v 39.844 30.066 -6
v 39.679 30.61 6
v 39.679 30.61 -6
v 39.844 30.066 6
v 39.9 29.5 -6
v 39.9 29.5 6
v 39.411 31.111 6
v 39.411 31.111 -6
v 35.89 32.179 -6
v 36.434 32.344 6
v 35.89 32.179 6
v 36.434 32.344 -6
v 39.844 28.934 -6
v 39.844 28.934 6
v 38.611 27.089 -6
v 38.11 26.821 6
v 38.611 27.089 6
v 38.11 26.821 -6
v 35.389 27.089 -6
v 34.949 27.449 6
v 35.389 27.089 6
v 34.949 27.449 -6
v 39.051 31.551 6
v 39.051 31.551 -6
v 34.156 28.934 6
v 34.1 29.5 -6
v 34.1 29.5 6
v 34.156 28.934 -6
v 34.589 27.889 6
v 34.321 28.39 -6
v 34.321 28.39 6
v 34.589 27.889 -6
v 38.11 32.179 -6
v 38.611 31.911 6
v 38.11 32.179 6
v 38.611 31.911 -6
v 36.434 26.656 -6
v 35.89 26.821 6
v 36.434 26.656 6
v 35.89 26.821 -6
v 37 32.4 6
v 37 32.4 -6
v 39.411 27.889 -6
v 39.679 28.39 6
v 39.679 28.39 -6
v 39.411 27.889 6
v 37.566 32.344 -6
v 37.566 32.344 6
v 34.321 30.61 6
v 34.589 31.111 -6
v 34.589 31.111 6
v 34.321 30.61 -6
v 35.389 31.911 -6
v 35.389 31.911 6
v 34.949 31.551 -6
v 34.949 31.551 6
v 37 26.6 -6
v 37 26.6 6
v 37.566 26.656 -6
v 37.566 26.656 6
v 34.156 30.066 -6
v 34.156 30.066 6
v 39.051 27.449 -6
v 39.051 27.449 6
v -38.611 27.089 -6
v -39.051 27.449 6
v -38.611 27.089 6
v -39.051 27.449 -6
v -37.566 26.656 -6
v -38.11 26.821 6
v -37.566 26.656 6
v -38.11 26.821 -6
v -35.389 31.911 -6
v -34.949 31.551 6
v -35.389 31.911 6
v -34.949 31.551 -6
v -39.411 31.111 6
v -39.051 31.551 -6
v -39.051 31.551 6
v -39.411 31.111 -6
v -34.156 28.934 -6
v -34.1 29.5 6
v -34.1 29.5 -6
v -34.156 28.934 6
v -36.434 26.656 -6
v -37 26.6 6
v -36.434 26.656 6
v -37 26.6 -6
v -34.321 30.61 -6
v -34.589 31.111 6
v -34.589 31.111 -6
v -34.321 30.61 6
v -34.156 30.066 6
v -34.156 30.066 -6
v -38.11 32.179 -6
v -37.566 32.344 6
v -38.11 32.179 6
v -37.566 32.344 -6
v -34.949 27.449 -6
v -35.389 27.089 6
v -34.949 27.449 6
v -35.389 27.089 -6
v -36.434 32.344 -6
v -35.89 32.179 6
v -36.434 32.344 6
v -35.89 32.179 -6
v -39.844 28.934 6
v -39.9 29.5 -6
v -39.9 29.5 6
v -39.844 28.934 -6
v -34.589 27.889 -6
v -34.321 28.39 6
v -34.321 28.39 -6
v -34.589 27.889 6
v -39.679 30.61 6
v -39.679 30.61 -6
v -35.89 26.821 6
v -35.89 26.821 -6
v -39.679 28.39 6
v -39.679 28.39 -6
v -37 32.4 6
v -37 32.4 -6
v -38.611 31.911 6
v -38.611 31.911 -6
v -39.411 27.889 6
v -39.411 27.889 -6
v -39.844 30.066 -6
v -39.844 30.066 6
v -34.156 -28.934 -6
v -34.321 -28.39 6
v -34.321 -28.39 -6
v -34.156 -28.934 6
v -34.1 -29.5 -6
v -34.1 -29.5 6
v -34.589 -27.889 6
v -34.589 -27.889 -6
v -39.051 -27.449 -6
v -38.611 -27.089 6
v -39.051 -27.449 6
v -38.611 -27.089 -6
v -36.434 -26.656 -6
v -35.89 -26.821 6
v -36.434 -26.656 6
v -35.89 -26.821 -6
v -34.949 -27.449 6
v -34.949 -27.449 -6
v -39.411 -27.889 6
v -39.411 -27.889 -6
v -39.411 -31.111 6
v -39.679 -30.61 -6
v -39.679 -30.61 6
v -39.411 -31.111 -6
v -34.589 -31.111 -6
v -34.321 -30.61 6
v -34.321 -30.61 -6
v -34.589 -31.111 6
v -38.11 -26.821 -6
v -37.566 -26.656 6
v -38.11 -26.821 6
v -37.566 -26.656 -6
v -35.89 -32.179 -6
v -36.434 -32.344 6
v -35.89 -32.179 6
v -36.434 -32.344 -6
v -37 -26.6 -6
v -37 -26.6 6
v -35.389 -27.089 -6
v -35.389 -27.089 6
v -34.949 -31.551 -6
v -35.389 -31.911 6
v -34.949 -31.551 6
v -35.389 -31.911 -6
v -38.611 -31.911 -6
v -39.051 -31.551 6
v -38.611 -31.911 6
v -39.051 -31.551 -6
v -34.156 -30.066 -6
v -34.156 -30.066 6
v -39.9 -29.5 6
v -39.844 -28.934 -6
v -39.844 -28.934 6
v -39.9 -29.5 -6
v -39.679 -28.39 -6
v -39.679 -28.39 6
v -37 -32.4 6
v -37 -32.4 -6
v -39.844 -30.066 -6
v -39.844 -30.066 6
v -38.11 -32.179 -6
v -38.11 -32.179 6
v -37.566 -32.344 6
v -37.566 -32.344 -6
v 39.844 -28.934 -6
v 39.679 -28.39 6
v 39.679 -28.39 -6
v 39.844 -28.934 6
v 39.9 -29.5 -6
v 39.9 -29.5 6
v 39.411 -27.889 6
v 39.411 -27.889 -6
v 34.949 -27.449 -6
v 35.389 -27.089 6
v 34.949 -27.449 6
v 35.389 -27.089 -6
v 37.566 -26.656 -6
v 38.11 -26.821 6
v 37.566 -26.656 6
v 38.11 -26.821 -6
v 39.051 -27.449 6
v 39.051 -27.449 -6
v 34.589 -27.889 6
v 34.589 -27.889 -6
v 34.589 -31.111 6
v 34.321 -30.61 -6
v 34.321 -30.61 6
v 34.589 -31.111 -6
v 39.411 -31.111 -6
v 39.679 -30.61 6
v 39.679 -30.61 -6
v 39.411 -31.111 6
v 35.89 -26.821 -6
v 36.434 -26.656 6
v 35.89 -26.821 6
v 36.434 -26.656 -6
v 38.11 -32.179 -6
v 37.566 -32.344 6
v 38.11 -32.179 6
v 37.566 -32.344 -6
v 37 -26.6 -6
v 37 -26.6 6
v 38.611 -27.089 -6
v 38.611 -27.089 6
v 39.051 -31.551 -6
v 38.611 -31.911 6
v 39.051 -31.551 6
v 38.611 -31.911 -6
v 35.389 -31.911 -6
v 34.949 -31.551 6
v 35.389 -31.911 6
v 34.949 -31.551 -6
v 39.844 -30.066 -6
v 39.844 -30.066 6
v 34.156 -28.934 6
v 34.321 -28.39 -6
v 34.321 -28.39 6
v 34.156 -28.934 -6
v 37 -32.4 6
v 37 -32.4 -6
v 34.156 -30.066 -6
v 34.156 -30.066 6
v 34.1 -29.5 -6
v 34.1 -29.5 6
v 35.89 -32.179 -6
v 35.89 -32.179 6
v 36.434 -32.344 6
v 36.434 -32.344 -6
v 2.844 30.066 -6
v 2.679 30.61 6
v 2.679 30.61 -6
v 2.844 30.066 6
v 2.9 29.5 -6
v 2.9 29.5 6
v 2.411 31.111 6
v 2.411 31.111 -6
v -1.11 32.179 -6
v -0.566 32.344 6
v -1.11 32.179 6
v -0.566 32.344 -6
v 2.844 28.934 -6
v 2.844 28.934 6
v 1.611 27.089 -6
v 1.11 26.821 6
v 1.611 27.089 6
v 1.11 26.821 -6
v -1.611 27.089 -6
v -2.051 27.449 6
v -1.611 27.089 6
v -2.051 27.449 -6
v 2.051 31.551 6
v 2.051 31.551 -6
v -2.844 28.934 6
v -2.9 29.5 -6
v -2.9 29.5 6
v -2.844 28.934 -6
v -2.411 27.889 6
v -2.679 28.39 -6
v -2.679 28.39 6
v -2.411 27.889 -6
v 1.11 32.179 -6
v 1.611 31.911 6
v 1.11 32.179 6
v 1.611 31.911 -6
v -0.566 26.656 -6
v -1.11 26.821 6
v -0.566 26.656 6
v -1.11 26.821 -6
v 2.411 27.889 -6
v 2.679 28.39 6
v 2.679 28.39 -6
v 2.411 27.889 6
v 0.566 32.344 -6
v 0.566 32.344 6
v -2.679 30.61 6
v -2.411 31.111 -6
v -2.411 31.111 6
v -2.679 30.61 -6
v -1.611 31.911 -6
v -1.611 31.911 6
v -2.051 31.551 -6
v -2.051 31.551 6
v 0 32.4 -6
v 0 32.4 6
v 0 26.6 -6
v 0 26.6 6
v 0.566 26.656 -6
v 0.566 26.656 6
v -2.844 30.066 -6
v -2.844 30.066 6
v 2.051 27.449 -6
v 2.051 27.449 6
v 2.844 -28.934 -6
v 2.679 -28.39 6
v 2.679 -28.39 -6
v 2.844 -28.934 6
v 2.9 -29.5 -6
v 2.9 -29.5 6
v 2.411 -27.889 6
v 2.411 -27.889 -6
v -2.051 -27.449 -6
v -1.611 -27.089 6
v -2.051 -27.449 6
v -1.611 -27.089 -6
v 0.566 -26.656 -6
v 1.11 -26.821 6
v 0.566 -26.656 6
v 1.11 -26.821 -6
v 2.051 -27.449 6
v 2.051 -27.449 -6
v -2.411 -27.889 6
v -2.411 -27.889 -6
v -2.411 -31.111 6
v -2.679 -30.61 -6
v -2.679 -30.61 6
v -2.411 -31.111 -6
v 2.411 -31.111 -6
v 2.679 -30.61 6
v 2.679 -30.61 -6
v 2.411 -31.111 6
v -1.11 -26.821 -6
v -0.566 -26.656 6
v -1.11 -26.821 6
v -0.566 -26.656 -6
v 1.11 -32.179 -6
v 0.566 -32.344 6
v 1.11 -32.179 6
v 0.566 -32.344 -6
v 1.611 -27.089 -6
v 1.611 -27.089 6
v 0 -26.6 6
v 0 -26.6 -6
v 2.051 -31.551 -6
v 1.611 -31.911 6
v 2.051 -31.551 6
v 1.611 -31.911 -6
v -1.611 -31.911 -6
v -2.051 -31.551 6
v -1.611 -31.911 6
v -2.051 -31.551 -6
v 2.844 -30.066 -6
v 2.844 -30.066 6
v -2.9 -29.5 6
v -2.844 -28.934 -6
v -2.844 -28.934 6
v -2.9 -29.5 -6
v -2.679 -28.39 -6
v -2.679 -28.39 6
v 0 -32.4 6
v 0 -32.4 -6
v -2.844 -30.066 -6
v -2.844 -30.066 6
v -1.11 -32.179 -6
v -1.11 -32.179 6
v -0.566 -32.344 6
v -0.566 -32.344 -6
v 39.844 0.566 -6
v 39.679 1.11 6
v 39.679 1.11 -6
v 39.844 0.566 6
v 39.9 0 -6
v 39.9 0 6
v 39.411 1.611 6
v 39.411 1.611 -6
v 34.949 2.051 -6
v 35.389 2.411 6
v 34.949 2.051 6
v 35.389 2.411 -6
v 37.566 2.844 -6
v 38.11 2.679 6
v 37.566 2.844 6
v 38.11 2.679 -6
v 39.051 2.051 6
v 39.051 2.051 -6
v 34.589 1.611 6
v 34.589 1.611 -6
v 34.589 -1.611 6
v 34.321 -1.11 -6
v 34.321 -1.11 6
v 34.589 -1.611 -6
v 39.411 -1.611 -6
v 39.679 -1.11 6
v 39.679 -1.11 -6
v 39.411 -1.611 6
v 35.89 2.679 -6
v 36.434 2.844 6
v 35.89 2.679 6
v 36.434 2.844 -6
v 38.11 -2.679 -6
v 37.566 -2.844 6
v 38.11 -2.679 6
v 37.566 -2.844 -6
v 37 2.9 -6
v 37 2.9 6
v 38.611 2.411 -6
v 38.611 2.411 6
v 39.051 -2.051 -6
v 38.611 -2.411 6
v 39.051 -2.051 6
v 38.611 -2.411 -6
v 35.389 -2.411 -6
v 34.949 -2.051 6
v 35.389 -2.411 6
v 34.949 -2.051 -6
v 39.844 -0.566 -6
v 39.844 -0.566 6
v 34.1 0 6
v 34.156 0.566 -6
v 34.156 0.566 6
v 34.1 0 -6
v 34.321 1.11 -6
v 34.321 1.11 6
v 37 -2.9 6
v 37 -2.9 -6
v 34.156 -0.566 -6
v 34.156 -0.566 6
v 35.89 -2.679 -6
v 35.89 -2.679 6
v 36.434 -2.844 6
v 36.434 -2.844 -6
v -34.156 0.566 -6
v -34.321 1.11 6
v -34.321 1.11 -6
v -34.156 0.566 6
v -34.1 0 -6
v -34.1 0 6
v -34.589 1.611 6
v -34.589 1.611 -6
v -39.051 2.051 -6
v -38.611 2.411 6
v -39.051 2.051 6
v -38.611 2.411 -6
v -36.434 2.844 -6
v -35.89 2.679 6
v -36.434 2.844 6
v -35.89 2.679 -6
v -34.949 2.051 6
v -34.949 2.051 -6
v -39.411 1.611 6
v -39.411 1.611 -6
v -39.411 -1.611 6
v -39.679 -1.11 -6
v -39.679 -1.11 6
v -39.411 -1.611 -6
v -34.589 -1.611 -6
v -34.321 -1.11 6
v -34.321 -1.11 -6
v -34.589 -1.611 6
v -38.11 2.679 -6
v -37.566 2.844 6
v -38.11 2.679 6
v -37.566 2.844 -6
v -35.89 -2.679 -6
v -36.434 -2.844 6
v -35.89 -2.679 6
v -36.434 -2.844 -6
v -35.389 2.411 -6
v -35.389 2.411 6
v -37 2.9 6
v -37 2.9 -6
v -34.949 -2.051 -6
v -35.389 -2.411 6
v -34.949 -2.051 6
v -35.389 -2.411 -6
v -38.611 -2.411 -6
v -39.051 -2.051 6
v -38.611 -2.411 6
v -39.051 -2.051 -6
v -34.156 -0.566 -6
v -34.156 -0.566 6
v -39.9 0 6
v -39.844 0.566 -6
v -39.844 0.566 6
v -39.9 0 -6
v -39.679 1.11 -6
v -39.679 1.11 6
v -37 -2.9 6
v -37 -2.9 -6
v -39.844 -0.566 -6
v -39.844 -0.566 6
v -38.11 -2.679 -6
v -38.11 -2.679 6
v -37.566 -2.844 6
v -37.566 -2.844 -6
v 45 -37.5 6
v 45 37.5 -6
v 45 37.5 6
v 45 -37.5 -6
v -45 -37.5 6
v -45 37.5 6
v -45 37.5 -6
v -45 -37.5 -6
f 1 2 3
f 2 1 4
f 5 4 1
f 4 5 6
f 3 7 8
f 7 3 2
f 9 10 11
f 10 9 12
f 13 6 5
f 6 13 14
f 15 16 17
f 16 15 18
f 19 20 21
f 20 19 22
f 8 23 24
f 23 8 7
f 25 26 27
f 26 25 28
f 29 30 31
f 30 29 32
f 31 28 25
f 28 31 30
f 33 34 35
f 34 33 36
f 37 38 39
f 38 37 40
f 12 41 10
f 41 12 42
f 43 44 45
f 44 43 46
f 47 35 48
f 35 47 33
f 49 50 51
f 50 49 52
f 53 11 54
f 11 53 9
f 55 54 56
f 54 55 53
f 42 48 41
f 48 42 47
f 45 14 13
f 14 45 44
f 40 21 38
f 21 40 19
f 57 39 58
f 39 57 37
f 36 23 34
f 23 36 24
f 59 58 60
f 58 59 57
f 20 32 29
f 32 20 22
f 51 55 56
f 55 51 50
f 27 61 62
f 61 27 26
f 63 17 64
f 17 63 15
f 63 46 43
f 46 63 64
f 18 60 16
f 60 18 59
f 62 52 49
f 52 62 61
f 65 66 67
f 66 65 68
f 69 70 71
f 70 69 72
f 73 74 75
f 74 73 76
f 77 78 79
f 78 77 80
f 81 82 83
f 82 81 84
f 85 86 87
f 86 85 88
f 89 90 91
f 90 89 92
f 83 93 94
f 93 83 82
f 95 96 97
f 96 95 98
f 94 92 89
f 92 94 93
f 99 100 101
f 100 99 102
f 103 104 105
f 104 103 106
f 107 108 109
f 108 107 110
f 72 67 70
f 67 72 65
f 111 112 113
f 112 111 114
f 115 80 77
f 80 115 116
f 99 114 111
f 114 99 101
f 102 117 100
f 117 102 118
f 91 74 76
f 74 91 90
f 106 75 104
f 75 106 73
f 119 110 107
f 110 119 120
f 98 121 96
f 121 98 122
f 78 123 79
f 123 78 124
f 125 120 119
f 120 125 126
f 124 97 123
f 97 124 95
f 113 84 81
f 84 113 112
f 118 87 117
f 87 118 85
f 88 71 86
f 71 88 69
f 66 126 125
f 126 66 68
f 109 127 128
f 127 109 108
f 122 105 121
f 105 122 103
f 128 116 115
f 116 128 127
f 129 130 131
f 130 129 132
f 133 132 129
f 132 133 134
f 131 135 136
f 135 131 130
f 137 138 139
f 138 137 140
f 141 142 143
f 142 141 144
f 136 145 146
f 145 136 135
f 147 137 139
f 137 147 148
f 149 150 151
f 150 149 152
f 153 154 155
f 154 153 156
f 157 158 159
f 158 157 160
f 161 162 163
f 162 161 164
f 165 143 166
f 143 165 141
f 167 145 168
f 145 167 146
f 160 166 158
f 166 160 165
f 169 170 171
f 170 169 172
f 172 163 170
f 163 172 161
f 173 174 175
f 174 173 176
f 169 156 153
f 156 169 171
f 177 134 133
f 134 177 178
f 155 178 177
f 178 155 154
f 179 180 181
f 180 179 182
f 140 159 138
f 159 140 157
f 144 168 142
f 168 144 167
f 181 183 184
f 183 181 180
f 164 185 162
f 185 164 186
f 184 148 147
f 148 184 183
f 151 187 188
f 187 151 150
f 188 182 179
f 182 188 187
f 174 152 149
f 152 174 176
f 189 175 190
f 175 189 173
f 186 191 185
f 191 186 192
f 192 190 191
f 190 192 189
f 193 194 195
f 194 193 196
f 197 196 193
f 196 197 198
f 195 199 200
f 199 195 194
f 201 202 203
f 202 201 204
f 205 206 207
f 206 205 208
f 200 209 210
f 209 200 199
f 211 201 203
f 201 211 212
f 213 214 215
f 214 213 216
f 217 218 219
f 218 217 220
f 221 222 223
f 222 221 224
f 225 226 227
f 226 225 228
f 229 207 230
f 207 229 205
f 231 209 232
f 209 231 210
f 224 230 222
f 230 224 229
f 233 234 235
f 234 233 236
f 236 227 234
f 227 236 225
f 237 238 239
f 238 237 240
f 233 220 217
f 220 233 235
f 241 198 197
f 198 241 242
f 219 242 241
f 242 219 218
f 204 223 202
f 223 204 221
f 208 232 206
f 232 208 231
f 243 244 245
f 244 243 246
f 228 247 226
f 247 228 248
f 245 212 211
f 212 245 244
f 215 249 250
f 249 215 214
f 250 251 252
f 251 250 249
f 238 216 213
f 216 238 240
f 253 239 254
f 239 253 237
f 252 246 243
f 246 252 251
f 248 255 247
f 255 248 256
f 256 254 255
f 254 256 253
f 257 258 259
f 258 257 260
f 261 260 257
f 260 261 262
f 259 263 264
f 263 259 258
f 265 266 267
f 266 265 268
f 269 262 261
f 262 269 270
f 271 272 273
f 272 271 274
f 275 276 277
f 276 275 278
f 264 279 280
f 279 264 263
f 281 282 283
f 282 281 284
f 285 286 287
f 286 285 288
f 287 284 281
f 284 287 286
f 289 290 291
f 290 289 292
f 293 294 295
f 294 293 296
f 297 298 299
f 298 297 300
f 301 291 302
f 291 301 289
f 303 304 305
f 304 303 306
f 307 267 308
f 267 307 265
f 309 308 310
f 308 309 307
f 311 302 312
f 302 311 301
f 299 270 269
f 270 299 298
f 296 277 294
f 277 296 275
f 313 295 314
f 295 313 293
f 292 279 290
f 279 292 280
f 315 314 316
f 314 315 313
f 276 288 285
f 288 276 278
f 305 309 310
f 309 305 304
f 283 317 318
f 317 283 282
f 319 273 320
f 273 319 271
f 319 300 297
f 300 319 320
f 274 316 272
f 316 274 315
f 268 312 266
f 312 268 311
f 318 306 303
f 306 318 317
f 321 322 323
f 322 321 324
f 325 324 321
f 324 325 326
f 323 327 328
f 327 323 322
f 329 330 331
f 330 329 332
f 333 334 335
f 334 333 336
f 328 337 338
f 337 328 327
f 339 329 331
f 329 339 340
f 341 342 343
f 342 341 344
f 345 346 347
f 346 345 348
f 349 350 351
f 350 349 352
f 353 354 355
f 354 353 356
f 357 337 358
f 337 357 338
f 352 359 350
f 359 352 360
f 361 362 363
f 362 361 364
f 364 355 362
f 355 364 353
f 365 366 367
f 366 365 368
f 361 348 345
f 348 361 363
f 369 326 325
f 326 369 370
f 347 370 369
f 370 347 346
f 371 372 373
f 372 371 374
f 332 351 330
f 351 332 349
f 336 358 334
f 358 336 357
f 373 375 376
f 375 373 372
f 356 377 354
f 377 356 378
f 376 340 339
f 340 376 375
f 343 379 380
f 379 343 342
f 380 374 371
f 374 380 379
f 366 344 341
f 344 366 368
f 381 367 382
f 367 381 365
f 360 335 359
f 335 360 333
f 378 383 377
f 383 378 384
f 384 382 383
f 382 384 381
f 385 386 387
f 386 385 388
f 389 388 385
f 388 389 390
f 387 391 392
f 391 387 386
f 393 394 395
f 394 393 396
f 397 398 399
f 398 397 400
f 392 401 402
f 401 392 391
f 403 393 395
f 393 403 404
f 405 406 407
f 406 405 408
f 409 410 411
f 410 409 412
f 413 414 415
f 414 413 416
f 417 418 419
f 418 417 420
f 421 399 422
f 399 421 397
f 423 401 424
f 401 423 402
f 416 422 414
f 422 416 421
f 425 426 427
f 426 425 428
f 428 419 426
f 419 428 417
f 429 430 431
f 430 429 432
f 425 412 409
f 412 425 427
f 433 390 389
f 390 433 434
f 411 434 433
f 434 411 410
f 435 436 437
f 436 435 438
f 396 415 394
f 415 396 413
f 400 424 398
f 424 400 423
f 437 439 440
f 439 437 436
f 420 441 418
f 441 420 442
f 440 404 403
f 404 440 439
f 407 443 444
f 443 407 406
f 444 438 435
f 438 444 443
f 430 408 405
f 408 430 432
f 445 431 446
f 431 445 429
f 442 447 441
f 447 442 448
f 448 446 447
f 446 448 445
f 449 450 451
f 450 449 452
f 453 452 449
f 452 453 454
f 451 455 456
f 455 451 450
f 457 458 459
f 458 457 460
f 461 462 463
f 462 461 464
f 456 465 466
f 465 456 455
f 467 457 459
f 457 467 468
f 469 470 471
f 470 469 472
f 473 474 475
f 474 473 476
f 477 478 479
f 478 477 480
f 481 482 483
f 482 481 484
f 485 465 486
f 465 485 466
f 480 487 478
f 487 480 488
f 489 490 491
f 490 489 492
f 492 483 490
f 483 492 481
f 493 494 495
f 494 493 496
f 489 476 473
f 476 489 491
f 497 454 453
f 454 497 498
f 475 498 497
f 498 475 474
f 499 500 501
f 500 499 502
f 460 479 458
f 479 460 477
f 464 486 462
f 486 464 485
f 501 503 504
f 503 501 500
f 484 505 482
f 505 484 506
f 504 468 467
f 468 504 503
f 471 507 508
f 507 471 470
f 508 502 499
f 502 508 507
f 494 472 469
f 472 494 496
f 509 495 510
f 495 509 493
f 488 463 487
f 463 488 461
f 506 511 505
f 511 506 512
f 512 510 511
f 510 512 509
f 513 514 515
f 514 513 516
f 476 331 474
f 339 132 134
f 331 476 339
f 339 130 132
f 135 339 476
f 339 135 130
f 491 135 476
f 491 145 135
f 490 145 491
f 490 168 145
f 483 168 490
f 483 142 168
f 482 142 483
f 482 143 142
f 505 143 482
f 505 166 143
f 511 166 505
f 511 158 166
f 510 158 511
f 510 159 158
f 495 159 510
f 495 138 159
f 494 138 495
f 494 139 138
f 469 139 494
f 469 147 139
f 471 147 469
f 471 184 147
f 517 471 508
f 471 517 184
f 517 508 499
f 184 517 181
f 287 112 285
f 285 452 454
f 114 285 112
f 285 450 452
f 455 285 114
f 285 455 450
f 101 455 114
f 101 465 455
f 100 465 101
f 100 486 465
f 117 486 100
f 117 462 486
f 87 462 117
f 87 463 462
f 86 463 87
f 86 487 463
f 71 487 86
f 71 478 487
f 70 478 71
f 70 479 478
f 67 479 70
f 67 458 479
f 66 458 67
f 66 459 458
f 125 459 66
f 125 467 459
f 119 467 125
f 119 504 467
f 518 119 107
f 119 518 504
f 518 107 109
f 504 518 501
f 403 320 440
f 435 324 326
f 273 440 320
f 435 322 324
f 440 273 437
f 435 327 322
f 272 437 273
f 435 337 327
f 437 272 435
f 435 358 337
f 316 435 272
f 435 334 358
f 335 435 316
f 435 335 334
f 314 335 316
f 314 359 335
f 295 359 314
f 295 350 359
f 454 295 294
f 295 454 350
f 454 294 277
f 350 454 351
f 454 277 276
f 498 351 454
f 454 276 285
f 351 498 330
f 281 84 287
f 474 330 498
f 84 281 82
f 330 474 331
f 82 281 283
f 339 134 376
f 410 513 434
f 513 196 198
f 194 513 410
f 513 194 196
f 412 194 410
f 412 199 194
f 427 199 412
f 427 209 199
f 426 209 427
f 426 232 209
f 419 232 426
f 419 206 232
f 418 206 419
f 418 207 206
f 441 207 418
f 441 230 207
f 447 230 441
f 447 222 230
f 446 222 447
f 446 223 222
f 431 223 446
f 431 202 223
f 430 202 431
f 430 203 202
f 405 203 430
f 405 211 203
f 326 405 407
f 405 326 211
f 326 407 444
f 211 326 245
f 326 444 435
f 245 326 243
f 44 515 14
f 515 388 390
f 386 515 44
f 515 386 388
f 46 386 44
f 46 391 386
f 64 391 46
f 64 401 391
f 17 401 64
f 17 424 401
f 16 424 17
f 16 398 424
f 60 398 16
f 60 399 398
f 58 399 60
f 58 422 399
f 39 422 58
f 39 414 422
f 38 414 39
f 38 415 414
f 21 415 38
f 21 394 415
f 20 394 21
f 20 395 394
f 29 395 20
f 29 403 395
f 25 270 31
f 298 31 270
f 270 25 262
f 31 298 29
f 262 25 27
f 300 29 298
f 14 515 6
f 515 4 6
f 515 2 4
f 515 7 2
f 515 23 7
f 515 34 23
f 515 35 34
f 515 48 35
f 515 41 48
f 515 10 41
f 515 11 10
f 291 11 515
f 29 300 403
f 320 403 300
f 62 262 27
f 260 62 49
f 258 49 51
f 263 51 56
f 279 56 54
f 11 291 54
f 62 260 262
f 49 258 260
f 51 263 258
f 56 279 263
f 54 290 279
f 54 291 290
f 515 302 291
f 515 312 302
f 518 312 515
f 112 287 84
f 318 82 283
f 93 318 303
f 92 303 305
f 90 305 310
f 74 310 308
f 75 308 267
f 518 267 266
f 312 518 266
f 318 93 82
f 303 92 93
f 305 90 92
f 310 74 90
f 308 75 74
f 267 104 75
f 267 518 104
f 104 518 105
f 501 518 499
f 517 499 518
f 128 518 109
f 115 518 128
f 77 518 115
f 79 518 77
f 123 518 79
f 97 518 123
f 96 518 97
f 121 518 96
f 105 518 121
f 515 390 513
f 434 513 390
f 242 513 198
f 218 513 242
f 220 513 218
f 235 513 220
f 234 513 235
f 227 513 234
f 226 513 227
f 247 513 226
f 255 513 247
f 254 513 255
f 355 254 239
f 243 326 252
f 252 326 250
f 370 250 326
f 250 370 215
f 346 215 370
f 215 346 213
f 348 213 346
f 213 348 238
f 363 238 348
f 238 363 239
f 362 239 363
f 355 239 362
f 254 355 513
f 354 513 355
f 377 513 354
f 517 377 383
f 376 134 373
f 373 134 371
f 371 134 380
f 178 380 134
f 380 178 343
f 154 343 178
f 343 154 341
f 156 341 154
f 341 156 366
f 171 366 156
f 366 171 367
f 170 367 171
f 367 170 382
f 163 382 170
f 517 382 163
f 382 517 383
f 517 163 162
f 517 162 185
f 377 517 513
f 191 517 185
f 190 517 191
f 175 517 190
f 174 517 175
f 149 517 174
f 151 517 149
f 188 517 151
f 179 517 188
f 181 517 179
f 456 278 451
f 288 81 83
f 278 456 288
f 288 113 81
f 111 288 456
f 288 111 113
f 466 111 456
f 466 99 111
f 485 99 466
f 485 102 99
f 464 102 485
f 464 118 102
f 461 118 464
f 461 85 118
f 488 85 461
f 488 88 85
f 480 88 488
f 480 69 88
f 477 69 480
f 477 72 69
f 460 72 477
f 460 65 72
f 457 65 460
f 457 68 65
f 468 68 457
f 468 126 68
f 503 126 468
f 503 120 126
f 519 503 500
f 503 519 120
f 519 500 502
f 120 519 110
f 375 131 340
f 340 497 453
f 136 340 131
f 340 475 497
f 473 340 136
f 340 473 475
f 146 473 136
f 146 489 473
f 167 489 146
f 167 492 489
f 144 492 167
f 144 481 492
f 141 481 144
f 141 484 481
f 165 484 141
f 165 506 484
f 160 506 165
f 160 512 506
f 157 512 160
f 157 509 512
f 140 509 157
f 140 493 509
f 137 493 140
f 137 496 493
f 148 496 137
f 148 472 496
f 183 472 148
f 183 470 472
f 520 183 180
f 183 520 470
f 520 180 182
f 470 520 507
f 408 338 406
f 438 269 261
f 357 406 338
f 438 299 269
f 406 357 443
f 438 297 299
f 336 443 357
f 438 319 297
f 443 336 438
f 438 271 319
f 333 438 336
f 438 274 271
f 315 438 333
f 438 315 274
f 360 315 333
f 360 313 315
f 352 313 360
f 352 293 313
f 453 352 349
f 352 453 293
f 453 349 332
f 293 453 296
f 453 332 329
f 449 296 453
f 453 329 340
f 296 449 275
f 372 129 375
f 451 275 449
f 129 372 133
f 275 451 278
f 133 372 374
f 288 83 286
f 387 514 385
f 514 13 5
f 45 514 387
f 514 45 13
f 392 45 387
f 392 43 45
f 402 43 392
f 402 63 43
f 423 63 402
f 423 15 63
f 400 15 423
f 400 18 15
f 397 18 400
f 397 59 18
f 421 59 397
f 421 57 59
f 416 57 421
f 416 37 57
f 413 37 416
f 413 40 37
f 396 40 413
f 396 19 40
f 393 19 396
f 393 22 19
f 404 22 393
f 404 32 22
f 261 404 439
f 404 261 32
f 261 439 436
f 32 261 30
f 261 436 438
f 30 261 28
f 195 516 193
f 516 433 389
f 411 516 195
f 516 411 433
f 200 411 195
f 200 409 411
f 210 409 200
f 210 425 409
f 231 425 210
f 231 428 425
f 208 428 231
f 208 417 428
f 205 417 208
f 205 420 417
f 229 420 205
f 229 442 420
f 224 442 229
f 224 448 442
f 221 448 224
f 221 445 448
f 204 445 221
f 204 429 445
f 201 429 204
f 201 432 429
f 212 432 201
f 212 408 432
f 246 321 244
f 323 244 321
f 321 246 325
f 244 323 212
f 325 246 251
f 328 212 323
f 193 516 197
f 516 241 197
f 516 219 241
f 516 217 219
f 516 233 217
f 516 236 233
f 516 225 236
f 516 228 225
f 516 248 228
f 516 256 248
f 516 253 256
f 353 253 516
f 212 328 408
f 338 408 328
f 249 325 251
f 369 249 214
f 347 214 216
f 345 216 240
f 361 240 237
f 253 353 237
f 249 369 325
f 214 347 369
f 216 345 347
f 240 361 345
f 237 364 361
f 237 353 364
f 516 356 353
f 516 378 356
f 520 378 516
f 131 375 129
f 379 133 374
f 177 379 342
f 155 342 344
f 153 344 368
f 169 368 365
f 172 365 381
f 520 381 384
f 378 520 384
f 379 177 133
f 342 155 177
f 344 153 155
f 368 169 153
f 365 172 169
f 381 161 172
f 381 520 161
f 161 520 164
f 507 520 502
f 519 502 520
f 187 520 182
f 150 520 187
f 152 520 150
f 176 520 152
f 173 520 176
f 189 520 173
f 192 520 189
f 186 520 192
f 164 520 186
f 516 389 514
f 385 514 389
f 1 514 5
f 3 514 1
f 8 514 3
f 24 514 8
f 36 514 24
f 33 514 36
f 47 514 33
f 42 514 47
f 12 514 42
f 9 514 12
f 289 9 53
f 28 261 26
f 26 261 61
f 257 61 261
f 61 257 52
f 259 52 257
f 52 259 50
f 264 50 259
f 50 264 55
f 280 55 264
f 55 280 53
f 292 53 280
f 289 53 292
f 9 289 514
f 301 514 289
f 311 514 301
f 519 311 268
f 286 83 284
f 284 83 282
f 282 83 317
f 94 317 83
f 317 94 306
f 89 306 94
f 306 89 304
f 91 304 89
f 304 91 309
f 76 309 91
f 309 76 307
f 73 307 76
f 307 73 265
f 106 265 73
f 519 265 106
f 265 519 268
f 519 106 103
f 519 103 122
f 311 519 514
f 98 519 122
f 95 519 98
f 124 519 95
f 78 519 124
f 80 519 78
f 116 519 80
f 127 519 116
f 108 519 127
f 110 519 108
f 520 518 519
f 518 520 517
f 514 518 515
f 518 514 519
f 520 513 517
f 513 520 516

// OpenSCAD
$fn = 32;

// ----------------------------------------------------------------------
// Corner plate 90 x 75 x 12
// 8 holes, centres taken from the edge offset
// ----------------------------------------------------------------------

// --- parameters (mm) ---
plate = [90, 75, 12];   // overall size (x, y, z)
holes = 8;              // number of holes the drawing asks for
bore_d = 5.5;           // nominal hole diameter from the drawing
print_allowance = 0.3;  // clearance added for printing
edge = 8;               // hole centre offset from the plate edge

// --- derived feature positions (mm) ---
hole_d = bore_d + print_allowance;  // = 5.8   hole diameter as printed
corner_x = plate[0] / 2 - edge;     // = 37   corner hole X
corner_y = plate[1] / 2 - edge;     // = 29.5   corner hole Y
feature_centers = [
  [corner_x, corner_y],
  [-corner_x, corner_y],
  [-corner_x, -corner_y],
  [corner_x, -corner_y],
  [0, corner_y],
  [0, -corner_y],
  [corner_x, 0],
  [-corner_x, 0]
];   // hole centres the loop below drills

// plate outline, every hole drilled through with the same cutters
difference() {
  cube(plate, center = true);
  for (centre = feature_centers)
    translate([centre[0], centre[1], 0])
      cylinder(d = hole_d, h = plate[2] + 2, center = true);
}
